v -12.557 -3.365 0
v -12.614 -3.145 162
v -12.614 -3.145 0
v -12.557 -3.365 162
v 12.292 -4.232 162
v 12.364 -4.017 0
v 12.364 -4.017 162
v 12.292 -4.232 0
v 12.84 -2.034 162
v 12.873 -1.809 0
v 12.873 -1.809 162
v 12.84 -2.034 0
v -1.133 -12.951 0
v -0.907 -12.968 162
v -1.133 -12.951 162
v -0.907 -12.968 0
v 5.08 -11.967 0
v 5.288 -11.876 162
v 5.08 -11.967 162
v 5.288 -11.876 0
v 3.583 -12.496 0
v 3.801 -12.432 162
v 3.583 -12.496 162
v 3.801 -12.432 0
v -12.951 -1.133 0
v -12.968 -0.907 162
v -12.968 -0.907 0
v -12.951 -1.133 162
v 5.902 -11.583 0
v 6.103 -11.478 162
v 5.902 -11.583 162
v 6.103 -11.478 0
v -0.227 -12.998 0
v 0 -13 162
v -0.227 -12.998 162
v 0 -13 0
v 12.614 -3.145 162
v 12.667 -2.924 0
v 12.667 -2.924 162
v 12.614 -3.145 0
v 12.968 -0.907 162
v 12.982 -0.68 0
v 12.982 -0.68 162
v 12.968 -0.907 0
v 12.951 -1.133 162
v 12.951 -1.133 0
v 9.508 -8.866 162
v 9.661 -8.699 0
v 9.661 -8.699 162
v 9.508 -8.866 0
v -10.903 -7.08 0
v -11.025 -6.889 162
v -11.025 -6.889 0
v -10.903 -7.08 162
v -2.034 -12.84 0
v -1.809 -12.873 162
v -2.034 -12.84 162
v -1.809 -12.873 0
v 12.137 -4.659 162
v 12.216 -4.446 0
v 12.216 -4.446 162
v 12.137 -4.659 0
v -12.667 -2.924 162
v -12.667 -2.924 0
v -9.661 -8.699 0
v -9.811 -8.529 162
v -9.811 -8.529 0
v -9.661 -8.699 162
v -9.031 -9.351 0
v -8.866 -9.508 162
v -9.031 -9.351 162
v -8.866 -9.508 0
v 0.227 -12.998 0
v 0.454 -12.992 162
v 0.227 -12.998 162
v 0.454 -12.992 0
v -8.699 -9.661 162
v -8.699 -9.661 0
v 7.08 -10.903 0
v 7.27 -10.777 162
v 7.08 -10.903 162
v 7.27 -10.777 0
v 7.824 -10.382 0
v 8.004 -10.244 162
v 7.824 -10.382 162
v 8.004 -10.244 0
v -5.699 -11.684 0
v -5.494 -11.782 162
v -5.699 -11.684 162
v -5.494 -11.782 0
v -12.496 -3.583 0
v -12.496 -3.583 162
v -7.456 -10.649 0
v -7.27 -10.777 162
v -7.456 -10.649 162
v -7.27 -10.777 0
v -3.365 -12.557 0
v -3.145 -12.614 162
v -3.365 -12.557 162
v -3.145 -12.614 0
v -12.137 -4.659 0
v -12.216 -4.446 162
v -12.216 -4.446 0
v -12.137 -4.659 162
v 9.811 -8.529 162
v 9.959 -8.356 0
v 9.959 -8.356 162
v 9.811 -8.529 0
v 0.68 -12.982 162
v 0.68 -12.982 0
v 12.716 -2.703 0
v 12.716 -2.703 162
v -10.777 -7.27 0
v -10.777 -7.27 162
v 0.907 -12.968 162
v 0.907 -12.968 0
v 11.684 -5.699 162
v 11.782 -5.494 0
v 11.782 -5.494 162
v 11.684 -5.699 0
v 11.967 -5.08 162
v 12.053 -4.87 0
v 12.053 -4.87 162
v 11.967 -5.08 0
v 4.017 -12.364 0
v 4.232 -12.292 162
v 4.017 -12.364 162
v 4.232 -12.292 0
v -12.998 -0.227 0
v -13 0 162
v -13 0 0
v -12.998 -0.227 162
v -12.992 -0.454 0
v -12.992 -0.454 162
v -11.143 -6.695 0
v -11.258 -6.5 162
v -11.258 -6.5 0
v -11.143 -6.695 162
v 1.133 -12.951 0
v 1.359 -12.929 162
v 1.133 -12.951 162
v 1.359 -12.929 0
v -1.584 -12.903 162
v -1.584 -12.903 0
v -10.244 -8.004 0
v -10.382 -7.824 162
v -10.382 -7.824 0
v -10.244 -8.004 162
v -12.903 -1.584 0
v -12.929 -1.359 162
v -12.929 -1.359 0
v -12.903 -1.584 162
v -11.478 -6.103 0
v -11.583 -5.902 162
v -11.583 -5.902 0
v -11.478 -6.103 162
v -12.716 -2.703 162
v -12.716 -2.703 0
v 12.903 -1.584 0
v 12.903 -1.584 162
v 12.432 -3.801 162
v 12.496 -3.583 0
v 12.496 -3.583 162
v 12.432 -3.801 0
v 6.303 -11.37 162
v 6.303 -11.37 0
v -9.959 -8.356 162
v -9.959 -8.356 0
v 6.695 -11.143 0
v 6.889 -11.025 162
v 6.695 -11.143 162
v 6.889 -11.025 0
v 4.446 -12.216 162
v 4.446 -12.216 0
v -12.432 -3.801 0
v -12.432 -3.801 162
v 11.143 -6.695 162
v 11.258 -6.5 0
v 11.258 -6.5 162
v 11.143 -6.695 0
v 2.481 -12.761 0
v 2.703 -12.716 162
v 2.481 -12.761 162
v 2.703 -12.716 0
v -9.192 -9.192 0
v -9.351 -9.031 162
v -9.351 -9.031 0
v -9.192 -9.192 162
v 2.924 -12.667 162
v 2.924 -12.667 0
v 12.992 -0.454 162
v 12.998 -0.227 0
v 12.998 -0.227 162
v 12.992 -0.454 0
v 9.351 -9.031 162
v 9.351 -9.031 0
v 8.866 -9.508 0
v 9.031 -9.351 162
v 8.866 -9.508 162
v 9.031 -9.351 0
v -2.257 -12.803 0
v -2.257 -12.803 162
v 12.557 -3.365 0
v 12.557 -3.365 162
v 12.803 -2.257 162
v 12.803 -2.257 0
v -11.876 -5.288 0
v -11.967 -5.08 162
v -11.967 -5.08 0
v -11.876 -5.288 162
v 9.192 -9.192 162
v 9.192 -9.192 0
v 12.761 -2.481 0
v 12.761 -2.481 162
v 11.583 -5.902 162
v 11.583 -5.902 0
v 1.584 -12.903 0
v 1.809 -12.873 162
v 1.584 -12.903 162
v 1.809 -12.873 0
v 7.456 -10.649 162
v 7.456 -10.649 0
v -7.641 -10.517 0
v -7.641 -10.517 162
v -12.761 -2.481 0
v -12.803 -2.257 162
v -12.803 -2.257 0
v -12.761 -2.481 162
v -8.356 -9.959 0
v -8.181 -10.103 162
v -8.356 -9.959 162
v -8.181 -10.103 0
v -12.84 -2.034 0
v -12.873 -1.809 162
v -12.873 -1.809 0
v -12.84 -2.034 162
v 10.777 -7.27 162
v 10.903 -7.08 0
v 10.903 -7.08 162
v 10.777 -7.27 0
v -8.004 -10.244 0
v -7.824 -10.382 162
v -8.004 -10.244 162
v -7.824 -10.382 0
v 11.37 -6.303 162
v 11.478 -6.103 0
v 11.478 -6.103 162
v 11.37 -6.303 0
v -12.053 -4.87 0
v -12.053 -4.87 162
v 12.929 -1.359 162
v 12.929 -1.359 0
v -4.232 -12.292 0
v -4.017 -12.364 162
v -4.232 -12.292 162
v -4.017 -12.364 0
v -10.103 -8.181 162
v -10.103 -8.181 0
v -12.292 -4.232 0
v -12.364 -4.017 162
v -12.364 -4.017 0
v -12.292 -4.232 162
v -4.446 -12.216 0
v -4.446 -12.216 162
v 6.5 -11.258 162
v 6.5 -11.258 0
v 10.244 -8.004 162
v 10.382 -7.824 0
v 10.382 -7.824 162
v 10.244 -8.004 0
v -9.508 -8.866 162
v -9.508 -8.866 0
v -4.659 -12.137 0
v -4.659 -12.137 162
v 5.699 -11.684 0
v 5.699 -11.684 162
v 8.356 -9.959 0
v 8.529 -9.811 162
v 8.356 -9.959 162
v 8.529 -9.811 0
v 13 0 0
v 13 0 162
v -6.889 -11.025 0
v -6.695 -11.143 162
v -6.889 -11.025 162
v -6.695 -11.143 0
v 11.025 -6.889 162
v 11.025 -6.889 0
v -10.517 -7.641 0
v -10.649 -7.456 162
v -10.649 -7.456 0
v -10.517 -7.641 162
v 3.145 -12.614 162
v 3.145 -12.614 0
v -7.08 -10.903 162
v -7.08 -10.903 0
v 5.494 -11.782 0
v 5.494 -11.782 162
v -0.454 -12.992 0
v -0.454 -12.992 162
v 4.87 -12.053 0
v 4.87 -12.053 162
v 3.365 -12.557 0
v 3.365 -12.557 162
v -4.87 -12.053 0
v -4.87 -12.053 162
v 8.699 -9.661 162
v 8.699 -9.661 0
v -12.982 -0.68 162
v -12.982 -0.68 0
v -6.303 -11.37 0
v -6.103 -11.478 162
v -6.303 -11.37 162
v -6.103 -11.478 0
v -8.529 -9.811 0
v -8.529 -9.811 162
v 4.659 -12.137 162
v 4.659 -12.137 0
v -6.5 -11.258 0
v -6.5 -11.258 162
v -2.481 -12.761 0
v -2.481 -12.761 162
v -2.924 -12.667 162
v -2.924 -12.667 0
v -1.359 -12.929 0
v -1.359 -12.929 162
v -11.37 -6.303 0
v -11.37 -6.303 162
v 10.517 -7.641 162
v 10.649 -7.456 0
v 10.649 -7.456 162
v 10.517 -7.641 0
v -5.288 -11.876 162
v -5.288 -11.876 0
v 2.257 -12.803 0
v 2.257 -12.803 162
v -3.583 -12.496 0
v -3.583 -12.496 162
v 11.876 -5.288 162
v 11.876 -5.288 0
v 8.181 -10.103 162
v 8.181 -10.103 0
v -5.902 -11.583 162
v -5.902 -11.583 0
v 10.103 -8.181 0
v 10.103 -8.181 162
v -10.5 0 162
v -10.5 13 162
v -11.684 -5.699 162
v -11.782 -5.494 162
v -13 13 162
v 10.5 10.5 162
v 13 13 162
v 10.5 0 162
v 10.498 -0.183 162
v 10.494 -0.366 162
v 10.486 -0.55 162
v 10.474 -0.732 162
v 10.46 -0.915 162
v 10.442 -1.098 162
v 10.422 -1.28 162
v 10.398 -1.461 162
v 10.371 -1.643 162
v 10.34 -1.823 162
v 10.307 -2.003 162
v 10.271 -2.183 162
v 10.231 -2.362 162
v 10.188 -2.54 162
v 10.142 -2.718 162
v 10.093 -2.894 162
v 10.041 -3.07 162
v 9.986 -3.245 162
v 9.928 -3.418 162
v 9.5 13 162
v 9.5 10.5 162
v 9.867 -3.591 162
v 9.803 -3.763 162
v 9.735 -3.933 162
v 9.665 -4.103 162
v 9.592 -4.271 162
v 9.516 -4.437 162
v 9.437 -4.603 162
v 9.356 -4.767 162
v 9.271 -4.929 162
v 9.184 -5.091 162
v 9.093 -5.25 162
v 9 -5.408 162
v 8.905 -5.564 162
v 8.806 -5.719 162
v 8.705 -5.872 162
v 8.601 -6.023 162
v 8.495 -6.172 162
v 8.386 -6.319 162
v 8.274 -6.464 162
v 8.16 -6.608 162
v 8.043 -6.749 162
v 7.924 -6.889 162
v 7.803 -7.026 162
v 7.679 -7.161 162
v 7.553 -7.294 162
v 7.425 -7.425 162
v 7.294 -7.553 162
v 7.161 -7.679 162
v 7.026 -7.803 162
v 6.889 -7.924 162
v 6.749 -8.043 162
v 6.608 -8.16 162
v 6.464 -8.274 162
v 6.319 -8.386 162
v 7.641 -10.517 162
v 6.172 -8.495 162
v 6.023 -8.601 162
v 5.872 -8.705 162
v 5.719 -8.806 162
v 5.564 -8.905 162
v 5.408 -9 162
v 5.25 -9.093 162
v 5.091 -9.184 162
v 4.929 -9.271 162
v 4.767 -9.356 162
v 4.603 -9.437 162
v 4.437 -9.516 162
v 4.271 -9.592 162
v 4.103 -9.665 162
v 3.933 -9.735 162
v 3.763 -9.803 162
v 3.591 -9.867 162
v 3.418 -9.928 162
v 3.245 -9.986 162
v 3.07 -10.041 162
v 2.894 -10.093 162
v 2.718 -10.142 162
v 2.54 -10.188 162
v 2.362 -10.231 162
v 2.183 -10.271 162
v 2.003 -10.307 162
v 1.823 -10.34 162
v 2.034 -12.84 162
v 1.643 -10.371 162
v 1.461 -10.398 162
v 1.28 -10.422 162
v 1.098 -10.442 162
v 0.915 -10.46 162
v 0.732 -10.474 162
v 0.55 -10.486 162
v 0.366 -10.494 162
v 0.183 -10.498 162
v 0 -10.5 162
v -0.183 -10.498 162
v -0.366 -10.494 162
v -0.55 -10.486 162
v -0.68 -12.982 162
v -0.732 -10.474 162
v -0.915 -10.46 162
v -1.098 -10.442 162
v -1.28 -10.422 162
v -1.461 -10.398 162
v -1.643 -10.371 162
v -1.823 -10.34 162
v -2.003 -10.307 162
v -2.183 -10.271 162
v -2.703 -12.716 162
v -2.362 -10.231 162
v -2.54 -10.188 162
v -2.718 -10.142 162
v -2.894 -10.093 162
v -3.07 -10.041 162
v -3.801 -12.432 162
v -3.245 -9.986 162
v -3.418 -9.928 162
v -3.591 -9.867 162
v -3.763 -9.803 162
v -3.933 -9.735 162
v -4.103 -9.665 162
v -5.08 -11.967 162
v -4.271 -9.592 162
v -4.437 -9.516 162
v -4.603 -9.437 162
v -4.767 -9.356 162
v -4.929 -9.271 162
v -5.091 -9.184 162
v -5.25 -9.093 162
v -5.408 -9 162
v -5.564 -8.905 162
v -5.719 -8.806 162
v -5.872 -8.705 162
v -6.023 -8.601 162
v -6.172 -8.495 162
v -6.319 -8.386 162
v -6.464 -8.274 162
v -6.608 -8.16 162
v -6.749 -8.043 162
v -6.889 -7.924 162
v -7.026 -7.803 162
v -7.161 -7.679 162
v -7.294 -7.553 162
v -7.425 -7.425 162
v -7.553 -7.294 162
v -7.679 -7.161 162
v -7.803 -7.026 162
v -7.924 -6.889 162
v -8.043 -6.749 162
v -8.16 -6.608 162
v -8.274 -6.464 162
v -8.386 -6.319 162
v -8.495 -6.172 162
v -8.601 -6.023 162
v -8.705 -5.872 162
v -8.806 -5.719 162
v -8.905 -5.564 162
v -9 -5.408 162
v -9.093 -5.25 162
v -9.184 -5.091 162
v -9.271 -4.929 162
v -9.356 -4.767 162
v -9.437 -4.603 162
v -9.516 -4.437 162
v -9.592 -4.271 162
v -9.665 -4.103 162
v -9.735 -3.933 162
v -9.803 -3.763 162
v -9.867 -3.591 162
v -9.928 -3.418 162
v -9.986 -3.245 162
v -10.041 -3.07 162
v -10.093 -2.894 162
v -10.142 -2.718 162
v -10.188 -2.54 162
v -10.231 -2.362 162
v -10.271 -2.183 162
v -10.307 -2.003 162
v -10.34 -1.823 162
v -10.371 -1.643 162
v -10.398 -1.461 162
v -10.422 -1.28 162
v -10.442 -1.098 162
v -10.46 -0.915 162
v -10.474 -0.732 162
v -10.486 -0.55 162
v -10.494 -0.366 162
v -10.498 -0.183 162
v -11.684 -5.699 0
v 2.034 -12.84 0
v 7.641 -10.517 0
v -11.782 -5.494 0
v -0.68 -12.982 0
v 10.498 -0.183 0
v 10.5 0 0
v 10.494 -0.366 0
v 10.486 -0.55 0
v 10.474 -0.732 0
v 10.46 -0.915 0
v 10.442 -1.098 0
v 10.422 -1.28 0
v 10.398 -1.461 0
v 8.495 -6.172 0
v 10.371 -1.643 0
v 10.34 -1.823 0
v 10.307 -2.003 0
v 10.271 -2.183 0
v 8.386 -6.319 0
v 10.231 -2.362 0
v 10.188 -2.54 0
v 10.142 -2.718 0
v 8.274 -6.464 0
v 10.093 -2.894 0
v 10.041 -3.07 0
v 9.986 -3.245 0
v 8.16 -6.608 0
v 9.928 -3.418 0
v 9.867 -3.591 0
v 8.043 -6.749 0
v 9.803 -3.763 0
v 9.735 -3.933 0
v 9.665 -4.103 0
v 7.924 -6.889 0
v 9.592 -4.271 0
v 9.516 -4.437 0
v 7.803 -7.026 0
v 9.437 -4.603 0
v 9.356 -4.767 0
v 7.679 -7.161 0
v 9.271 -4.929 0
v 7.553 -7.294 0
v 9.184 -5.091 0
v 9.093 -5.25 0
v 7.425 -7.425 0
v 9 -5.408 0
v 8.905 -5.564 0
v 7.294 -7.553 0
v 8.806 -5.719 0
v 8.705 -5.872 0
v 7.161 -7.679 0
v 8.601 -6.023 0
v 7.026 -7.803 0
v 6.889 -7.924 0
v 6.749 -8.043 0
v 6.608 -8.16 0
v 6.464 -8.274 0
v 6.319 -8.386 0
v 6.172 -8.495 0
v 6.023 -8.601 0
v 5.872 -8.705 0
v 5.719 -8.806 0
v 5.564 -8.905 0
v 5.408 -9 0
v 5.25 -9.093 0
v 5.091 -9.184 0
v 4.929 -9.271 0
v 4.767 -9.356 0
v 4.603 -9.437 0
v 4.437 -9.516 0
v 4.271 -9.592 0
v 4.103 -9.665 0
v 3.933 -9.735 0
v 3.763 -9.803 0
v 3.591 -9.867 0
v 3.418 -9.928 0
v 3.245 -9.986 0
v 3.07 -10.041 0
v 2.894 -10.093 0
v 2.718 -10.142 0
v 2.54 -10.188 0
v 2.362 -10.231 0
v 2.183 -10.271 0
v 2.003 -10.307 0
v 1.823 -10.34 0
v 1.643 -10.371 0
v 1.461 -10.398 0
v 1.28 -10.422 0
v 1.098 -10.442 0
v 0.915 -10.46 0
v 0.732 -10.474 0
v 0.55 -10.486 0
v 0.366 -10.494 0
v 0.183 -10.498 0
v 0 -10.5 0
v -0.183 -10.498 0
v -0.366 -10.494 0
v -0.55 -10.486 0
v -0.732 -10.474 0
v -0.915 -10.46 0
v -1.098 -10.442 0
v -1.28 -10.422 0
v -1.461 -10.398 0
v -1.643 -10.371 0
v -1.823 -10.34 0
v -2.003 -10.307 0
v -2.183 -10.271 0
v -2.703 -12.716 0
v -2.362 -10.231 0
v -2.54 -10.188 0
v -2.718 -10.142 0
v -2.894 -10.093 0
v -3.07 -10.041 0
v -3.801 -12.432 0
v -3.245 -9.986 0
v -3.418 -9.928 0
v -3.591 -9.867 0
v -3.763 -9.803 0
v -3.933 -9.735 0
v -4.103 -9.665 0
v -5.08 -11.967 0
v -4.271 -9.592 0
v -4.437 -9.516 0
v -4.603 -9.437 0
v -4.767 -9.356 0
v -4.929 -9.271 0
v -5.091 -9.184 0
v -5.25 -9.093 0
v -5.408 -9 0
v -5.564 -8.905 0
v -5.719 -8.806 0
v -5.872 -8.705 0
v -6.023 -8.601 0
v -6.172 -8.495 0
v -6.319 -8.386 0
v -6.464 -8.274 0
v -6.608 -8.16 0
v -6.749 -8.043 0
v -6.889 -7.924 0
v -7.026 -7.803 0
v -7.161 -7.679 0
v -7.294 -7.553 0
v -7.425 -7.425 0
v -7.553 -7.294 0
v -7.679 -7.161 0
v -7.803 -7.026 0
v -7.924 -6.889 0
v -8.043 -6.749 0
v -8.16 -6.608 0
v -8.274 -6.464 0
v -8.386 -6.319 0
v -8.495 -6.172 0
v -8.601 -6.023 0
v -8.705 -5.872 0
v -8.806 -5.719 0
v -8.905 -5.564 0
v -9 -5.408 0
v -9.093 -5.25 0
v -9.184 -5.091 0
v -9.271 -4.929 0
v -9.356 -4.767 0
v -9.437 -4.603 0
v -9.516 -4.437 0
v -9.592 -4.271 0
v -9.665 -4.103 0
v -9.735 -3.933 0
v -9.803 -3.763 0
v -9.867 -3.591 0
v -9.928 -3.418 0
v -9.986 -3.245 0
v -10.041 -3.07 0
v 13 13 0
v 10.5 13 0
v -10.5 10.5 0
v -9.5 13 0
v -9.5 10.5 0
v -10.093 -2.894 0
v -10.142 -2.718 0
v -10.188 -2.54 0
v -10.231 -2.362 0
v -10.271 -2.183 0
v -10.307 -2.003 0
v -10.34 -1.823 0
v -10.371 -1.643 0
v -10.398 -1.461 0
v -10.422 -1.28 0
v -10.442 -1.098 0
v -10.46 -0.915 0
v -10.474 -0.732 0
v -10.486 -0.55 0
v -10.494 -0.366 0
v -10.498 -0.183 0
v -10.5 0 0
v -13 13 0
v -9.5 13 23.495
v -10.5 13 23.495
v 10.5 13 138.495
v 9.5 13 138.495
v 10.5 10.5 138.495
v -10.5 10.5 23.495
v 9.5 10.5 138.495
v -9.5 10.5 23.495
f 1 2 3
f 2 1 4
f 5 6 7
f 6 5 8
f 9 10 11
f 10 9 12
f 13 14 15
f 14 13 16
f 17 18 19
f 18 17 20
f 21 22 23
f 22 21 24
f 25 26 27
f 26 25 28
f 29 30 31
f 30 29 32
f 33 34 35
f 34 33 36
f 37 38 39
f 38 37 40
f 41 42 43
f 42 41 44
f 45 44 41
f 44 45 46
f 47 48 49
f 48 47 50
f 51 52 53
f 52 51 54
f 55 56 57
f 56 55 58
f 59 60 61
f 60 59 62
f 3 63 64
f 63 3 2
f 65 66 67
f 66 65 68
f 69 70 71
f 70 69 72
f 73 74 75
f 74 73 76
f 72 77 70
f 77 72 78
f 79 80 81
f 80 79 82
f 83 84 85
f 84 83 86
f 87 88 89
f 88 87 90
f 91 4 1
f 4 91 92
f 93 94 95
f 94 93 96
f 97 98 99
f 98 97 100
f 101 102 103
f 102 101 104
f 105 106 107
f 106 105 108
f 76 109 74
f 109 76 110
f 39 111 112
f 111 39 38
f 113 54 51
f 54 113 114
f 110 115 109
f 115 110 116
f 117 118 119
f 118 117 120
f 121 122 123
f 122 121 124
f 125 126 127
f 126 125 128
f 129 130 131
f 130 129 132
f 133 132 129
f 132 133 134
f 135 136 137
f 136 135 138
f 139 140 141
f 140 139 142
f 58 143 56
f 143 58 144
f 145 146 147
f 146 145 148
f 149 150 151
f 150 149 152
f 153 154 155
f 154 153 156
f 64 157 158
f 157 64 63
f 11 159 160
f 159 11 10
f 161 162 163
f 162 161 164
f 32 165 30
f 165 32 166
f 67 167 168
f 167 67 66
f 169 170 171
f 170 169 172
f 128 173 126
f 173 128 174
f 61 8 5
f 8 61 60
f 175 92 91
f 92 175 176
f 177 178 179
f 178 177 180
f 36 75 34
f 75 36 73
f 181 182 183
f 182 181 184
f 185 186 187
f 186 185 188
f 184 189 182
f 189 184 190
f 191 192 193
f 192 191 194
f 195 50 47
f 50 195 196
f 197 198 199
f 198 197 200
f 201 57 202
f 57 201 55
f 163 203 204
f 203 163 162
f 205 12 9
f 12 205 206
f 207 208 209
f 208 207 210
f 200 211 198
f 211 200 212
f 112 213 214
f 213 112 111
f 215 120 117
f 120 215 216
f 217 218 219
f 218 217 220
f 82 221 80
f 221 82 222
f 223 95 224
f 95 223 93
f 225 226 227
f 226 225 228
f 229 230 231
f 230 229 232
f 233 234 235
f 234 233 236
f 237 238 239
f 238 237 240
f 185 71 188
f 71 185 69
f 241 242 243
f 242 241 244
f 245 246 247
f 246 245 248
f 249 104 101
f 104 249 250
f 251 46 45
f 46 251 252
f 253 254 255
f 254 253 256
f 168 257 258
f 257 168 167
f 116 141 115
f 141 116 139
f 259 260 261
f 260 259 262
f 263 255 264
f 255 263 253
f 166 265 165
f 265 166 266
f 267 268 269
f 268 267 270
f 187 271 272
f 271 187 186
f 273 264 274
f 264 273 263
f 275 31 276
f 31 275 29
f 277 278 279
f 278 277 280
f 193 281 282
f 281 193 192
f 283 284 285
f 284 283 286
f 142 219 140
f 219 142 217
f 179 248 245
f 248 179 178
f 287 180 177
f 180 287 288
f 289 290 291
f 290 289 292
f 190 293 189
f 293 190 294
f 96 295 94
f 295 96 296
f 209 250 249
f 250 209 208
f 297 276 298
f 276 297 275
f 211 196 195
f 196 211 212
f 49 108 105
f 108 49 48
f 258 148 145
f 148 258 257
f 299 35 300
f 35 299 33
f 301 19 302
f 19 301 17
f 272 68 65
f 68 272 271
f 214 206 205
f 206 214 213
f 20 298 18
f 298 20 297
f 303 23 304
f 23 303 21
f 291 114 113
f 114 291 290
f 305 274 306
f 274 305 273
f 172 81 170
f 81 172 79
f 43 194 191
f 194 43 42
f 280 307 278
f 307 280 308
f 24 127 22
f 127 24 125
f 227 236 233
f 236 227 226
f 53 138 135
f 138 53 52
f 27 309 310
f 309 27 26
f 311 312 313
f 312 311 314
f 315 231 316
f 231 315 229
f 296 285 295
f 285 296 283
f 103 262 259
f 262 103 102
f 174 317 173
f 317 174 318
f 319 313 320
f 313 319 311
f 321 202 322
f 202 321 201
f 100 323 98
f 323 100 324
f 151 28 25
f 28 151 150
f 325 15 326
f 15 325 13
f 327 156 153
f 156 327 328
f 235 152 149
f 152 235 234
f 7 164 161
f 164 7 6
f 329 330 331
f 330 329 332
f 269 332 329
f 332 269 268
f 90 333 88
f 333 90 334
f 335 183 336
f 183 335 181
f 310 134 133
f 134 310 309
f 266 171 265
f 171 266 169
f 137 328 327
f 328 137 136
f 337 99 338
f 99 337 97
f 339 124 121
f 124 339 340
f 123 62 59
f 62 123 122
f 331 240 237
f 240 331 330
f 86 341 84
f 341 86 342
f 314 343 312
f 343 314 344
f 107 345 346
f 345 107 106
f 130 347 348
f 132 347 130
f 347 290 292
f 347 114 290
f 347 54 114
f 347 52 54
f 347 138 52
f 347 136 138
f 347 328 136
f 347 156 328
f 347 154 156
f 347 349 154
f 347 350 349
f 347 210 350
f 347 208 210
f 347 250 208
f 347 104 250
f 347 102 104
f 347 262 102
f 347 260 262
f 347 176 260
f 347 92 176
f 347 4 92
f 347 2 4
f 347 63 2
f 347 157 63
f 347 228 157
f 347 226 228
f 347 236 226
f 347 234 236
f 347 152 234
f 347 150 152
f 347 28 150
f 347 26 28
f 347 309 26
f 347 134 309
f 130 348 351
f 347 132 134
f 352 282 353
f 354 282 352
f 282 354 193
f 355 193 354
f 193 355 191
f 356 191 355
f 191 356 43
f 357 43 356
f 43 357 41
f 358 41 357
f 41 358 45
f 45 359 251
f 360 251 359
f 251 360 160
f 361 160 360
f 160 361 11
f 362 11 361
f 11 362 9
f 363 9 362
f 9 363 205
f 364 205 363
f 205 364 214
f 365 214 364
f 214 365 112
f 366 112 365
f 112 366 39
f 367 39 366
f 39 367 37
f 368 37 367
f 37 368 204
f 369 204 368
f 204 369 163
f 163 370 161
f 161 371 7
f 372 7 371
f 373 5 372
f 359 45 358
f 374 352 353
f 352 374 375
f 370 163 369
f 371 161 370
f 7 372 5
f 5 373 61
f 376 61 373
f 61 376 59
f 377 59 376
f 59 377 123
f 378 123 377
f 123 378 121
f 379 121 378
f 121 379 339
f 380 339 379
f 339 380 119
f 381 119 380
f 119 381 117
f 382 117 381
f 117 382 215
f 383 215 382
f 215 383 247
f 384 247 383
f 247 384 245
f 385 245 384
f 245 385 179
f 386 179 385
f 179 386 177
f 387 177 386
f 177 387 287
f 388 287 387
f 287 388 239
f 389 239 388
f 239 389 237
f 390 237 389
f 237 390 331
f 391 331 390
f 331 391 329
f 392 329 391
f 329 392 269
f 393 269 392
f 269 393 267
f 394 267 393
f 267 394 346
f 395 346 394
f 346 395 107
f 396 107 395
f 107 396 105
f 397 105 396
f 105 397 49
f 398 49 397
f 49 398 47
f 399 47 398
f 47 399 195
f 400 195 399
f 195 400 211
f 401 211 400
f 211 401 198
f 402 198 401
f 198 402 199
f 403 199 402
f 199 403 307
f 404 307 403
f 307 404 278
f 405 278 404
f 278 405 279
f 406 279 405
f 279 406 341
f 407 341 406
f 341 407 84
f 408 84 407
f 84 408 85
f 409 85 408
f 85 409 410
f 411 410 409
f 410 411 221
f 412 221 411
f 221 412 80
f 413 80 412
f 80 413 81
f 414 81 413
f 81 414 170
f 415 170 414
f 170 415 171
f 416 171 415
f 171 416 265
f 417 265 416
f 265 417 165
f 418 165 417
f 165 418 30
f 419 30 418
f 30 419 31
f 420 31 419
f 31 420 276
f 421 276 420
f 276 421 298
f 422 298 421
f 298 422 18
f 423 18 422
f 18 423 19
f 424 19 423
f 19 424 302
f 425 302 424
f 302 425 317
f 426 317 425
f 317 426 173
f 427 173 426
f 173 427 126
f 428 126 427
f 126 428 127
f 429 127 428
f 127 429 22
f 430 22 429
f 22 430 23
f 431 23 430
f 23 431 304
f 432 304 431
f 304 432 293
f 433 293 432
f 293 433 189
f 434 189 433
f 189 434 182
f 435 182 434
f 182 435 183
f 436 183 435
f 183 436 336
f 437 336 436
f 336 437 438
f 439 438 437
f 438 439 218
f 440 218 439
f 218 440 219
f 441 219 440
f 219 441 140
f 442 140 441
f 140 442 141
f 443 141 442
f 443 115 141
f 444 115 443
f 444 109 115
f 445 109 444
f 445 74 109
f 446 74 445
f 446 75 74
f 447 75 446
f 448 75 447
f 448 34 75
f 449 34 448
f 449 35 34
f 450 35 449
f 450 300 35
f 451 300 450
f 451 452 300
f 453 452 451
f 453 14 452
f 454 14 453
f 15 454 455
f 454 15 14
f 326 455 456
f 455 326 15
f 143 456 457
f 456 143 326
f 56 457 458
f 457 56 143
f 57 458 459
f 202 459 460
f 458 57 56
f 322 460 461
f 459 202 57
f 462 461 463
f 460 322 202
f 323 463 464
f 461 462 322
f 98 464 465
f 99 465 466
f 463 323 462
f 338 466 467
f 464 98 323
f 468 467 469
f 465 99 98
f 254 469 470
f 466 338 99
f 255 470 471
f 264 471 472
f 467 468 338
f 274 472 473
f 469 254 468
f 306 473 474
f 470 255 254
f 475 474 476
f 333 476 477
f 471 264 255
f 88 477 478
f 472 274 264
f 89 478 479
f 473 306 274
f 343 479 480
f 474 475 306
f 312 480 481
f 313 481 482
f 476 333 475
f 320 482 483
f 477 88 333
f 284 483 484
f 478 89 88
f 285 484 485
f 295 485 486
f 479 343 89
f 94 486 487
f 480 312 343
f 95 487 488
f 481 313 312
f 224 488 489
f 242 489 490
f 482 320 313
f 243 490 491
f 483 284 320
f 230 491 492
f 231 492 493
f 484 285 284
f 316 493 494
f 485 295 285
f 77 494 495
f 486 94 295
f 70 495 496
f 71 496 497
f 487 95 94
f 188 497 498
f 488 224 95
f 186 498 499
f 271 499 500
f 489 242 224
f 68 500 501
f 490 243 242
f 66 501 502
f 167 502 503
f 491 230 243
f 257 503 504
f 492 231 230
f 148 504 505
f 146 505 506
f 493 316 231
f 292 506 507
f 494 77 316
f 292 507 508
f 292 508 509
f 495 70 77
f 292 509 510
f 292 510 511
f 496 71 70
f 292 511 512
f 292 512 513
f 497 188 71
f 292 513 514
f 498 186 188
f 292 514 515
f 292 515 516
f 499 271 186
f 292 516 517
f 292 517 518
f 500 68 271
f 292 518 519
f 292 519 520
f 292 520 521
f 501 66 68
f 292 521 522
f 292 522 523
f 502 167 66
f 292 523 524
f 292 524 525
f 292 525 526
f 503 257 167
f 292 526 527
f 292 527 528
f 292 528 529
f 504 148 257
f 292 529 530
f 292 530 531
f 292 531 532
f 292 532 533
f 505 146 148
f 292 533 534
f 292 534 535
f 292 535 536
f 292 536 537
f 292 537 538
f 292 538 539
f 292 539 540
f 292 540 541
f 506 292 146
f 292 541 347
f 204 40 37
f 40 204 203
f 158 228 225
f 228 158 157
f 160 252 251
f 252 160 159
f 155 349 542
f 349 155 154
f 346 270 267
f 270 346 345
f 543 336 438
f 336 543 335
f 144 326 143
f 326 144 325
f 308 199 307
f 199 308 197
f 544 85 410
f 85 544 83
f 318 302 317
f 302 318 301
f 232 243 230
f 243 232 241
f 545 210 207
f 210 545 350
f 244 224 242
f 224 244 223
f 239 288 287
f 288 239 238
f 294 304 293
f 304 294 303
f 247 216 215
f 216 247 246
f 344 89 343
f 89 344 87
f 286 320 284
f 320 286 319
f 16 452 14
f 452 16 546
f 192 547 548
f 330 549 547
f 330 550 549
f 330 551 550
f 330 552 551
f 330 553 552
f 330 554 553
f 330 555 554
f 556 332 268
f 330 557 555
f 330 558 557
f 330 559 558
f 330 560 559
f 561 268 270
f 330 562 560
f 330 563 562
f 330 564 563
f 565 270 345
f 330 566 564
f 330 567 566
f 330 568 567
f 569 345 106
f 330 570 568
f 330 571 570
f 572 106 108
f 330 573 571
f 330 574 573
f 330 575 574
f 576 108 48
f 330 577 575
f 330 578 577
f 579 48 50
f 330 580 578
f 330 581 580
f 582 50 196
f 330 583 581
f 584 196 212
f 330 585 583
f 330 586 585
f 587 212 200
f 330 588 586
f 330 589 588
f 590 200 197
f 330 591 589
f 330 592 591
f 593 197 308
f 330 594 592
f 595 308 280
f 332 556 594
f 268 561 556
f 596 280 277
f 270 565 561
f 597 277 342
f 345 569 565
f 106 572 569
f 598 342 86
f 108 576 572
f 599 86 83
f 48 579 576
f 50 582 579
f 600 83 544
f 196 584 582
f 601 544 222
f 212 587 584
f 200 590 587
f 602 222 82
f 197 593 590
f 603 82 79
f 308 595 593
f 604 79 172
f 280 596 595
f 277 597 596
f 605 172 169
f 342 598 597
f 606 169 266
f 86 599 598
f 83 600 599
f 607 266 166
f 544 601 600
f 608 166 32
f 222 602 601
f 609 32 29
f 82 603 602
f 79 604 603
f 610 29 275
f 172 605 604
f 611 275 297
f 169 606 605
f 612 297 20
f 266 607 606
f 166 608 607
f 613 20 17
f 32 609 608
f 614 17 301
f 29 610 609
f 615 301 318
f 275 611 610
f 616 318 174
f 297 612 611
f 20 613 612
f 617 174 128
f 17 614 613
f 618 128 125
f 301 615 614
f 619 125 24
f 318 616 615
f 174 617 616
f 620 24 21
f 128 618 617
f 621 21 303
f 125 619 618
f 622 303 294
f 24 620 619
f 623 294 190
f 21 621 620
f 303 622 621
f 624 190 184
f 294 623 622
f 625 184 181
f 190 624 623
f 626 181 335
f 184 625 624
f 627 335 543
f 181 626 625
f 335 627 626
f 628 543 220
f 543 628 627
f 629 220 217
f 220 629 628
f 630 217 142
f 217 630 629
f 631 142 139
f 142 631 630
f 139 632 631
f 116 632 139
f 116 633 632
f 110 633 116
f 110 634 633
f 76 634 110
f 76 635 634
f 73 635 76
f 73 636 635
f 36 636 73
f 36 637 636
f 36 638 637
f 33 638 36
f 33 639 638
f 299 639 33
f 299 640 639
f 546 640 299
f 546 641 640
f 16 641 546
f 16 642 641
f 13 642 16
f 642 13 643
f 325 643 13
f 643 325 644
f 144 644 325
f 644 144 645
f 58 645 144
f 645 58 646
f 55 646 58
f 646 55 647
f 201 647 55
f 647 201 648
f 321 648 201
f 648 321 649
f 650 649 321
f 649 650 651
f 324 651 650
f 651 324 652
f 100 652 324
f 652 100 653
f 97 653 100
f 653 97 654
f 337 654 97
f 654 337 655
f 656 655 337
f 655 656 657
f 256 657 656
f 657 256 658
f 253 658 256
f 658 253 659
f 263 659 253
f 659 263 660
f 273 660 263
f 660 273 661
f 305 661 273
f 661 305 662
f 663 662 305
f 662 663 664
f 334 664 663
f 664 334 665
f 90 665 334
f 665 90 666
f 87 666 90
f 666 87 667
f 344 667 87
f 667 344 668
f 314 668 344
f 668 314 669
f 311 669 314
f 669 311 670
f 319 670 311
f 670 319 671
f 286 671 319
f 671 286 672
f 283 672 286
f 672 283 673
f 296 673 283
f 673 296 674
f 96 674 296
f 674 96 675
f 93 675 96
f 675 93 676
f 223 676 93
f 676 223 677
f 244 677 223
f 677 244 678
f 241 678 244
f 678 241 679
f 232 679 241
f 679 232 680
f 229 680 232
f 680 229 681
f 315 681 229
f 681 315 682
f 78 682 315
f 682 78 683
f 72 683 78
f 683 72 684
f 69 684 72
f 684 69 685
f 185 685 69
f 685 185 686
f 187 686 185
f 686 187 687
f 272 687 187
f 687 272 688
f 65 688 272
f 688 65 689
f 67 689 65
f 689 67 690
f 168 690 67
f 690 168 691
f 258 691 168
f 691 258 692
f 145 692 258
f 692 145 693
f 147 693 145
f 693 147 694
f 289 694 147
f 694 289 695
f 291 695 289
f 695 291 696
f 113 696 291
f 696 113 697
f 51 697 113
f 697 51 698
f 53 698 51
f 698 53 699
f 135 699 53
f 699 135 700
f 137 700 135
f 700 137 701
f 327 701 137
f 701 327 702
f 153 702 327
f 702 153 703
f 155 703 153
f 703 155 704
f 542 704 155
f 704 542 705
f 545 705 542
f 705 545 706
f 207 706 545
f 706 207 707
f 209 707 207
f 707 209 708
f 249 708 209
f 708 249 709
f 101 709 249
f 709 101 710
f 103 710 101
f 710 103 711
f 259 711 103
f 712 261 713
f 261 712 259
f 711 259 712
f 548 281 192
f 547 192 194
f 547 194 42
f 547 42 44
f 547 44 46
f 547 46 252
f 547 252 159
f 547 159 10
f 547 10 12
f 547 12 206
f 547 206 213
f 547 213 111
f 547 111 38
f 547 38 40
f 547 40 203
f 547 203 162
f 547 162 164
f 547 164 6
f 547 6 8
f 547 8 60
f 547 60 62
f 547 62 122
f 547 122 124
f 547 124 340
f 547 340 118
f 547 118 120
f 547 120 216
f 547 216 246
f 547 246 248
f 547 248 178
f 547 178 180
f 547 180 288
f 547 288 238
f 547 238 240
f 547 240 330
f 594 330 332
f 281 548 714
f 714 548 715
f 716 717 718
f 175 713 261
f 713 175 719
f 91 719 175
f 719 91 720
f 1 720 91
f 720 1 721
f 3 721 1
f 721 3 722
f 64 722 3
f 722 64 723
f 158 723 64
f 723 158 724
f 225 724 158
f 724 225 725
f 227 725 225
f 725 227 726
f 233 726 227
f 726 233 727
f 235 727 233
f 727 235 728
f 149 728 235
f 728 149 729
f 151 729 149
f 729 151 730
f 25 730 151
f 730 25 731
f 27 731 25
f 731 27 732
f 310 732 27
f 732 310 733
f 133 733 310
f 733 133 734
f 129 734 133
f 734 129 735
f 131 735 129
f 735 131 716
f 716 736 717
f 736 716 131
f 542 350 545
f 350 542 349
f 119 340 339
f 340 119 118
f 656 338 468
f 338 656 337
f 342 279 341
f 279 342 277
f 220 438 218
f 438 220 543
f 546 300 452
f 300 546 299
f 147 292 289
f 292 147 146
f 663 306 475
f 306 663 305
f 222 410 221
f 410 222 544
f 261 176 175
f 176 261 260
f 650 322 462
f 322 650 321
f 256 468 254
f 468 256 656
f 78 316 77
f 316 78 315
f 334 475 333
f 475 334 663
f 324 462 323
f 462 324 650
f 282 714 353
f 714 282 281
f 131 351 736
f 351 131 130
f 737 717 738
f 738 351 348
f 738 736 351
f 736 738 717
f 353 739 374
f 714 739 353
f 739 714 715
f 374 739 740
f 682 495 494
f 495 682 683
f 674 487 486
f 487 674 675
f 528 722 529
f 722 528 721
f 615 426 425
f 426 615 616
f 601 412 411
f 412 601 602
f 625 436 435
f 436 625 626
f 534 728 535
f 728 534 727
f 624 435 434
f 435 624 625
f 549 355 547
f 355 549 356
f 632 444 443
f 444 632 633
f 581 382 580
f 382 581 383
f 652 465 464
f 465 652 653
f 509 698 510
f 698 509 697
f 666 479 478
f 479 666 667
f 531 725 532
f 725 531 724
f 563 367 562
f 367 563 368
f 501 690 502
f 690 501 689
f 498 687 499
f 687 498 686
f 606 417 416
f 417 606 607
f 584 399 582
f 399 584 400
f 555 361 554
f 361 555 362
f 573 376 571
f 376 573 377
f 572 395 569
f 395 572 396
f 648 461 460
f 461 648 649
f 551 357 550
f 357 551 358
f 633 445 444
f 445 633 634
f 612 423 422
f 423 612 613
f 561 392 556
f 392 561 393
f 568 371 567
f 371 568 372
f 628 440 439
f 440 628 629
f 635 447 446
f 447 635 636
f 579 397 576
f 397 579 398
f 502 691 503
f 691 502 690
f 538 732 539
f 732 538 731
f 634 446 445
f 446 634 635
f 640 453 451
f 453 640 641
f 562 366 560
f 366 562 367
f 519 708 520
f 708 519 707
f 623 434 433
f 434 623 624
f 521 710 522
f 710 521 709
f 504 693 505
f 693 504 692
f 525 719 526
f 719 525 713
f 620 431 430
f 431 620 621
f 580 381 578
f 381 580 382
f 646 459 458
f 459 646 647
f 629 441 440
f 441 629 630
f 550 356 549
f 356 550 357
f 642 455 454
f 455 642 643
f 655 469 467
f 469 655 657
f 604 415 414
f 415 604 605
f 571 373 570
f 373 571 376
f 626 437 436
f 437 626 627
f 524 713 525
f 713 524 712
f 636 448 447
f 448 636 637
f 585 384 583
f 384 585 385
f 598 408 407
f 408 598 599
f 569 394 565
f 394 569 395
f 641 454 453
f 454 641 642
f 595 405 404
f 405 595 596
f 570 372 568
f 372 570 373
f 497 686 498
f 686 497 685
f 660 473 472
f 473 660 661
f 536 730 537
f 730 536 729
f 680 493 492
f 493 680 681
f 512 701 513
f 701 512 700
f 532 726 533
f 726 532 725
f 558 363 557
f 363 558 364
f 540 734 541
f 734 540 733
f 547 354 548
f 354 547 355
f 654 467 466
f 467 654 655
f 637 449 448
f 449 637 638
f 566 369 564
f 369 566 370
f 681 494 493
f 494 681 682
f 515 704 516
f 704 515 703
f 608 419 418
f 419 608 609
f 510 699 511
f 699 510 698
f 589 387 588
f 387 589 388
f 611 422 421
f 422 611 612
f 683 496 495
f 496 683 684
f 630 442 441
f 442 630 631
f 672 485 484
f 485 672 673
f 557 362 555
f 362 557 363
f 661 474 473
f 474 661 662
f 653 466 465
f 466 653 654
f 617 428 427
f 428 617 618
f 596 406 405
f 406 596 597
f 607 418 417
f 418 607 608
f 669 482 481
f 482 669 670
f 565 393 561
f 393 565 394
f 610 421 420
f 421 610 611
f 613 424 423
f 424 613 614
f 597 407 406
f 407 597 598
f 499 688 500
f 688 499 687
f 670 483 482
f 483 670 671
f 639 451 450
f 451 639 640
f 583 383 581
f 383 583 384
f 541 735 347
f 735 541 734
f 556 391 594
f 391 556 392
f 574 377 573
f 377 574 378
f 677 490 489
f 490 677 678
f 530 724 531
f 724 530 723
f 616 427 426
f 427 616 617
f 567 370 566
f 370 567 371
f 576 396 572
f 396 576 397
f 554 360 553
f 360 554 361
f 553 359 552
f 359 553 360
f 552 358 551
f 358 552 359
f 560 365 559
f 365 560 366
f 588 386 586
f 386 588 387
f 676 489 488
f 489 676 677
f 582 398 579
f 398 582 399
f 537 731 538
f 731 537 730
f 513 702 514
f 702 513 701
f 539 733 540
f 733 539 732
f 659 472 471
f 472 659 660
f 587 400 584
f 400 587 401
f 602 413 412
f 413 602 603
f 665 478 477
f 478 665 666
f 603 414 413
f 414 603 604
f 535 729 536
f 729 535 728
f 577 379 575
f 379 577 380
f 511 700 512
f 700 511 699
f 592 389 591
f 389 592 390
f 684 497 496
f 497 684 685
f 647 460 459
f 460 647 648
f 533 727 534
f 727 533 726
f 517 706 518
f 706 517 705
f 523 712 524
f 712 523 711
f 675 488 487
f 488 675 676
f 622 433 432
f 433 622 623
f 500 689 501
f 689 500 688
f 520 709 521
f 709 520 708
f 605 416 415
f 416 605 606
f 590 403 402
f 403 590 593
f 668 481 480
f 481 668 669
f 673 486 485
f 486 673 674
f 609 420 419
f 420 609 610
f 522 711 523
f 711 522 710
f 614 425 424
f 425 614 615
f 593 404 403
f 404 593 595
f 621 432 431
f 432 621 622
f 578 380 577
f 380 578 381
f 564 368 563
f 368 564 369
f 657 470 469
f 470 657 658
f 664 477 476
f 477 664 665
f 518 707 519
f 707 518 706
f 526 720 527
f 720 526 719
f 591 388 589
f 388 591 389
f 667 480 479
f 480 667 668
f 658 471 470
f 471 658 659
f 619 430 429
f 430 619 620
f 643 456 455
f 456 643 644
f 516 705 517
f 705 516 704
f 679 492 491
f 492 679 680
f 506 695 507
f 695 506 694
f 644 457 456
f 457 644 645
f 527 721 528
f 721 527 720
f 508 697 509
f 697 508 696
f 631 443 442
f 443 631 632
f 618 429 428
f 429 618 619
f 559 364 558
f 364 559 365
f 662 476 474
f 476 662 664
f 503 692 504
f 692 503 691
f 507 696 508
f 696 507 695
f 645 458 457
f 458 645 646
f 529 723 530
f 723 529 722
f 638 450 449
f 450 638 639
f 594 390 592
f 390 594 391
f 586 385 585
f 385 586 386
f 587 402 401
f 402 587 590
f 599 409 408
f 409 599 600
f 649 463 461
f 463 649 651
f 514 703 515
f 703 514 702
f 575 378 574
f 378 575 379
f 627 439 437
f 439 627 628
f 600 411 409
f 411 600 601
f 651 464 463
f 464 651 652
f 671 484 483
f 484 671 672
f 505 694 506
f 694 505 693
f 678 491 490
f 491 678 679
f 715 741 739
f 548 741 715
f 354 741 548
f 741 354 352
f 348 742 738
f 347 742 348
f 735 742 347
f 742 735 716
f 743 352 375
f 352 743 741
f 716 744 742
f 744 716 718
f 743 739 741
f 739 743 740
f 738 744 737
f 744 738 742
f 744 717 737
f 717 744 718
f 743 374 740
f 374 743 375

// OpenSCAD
// file: ../../modules/hexagon.scad
module hexagon(r = 1) {
  polygon([
    [-1 * r, 0],
    [-.5 * r, r * sqrt(3) / 2],
    [.5 * r, r * sqrt(3) / 2],
    [1 * r, 0],
    [.5 * r, r * sqrt(3) / -2],
    [-.5 * r, r * sqrt(3) / -2],
  ]);
}
// file: ../../modules/breakPart.scad
module rotFromTo(di,do)
    if( norm(di-do)==0 || norm(di)==0 || norm(do)==0 )
        children();
    else
        mirror(do/norm(do)+di/norm(di)) mirror(di) children(); 

module breakPart(normal = [0, 0, 0], shift=0, pinLocs = [[0, 0]], pinType = 0) {
  // First child is the part itself, second child is the pin
  //   - The pin should be centered in x and y and into the positive z direction
  // normal: Vector normal to the plane of breaking
  // shift: How far from the origin to move the center of the plane
  // pinOffset: Offset for pin (hole -> wider, pin -> narrower)
  // pinType: [0: attached (M), 1: F]
  _BIG = 250;

  difference() {
    children(0);
    rotFromTo([0, 0, 1], normal) translate([0, 0, shift]) {
      difference() {
        cylinder(r = _BIG/2, h = _BIG);
        if (pinType == 0) for (loc = pinLocs) {
          translate(concat(loc, [shift - eps])) {
            children(1);
          }
        }
      }
      if (pinType == 1) for (loc = pinLocs) {
        mirror([0, 0, 1]) translate(concat(loc, [shift - eps])) {
          children(1);
        }
      }
    } 
  }

}
// file: ../../_constants.scad
include <modules/breakPart.scad>;
include <modules/hexagon.scad>;

$fa=1 + 0; // default minimum facet angle is now 0.5
$fs=0.01 + 0; // default minimum facet size is now 0.05 mm
eps = .005 + 0;
tol = .1;

defaultFont = "Bitstream Vera Sans Mono:style=Bold";
// main file
include <../../_constants.scad>

width = 26;
thickness = 2.5;
length = 162;

tabThickness = 3.5;
tabDepth = 2.5;
tabLength = 23.5;

difference() {
    union() {
        cylinder(r = width/2, h=length);
        translate([-width/2, 0, 0]) cube([width, width/2, length]);
    }

    translate([0, 0, -eps]) union() {
        cylinder(r = width/2 - thickness, h=length + 2*eps);
        translate([-width/2 + thickness, 0, 0]) cube([width - thickness*2, width/2 - tabDepth, length + 2*eps]);
        translate([-width/2 + thickness, 0, tabLength]) cube([width - thickness*2, width/2 + eps, length - tabLength * 2]);
        translate([-width/2 + tabThickness, 0, -eps]) cube([width - thickness - tabThickness, width/2 + eps, tabLength + eps*2]);
        translate([-width/2 + thickness, 0, length - tabLength - eps]) cube([width - thickness - tabThickness, width/2 + eps, tabLength + eps * 3]);
    }
}
